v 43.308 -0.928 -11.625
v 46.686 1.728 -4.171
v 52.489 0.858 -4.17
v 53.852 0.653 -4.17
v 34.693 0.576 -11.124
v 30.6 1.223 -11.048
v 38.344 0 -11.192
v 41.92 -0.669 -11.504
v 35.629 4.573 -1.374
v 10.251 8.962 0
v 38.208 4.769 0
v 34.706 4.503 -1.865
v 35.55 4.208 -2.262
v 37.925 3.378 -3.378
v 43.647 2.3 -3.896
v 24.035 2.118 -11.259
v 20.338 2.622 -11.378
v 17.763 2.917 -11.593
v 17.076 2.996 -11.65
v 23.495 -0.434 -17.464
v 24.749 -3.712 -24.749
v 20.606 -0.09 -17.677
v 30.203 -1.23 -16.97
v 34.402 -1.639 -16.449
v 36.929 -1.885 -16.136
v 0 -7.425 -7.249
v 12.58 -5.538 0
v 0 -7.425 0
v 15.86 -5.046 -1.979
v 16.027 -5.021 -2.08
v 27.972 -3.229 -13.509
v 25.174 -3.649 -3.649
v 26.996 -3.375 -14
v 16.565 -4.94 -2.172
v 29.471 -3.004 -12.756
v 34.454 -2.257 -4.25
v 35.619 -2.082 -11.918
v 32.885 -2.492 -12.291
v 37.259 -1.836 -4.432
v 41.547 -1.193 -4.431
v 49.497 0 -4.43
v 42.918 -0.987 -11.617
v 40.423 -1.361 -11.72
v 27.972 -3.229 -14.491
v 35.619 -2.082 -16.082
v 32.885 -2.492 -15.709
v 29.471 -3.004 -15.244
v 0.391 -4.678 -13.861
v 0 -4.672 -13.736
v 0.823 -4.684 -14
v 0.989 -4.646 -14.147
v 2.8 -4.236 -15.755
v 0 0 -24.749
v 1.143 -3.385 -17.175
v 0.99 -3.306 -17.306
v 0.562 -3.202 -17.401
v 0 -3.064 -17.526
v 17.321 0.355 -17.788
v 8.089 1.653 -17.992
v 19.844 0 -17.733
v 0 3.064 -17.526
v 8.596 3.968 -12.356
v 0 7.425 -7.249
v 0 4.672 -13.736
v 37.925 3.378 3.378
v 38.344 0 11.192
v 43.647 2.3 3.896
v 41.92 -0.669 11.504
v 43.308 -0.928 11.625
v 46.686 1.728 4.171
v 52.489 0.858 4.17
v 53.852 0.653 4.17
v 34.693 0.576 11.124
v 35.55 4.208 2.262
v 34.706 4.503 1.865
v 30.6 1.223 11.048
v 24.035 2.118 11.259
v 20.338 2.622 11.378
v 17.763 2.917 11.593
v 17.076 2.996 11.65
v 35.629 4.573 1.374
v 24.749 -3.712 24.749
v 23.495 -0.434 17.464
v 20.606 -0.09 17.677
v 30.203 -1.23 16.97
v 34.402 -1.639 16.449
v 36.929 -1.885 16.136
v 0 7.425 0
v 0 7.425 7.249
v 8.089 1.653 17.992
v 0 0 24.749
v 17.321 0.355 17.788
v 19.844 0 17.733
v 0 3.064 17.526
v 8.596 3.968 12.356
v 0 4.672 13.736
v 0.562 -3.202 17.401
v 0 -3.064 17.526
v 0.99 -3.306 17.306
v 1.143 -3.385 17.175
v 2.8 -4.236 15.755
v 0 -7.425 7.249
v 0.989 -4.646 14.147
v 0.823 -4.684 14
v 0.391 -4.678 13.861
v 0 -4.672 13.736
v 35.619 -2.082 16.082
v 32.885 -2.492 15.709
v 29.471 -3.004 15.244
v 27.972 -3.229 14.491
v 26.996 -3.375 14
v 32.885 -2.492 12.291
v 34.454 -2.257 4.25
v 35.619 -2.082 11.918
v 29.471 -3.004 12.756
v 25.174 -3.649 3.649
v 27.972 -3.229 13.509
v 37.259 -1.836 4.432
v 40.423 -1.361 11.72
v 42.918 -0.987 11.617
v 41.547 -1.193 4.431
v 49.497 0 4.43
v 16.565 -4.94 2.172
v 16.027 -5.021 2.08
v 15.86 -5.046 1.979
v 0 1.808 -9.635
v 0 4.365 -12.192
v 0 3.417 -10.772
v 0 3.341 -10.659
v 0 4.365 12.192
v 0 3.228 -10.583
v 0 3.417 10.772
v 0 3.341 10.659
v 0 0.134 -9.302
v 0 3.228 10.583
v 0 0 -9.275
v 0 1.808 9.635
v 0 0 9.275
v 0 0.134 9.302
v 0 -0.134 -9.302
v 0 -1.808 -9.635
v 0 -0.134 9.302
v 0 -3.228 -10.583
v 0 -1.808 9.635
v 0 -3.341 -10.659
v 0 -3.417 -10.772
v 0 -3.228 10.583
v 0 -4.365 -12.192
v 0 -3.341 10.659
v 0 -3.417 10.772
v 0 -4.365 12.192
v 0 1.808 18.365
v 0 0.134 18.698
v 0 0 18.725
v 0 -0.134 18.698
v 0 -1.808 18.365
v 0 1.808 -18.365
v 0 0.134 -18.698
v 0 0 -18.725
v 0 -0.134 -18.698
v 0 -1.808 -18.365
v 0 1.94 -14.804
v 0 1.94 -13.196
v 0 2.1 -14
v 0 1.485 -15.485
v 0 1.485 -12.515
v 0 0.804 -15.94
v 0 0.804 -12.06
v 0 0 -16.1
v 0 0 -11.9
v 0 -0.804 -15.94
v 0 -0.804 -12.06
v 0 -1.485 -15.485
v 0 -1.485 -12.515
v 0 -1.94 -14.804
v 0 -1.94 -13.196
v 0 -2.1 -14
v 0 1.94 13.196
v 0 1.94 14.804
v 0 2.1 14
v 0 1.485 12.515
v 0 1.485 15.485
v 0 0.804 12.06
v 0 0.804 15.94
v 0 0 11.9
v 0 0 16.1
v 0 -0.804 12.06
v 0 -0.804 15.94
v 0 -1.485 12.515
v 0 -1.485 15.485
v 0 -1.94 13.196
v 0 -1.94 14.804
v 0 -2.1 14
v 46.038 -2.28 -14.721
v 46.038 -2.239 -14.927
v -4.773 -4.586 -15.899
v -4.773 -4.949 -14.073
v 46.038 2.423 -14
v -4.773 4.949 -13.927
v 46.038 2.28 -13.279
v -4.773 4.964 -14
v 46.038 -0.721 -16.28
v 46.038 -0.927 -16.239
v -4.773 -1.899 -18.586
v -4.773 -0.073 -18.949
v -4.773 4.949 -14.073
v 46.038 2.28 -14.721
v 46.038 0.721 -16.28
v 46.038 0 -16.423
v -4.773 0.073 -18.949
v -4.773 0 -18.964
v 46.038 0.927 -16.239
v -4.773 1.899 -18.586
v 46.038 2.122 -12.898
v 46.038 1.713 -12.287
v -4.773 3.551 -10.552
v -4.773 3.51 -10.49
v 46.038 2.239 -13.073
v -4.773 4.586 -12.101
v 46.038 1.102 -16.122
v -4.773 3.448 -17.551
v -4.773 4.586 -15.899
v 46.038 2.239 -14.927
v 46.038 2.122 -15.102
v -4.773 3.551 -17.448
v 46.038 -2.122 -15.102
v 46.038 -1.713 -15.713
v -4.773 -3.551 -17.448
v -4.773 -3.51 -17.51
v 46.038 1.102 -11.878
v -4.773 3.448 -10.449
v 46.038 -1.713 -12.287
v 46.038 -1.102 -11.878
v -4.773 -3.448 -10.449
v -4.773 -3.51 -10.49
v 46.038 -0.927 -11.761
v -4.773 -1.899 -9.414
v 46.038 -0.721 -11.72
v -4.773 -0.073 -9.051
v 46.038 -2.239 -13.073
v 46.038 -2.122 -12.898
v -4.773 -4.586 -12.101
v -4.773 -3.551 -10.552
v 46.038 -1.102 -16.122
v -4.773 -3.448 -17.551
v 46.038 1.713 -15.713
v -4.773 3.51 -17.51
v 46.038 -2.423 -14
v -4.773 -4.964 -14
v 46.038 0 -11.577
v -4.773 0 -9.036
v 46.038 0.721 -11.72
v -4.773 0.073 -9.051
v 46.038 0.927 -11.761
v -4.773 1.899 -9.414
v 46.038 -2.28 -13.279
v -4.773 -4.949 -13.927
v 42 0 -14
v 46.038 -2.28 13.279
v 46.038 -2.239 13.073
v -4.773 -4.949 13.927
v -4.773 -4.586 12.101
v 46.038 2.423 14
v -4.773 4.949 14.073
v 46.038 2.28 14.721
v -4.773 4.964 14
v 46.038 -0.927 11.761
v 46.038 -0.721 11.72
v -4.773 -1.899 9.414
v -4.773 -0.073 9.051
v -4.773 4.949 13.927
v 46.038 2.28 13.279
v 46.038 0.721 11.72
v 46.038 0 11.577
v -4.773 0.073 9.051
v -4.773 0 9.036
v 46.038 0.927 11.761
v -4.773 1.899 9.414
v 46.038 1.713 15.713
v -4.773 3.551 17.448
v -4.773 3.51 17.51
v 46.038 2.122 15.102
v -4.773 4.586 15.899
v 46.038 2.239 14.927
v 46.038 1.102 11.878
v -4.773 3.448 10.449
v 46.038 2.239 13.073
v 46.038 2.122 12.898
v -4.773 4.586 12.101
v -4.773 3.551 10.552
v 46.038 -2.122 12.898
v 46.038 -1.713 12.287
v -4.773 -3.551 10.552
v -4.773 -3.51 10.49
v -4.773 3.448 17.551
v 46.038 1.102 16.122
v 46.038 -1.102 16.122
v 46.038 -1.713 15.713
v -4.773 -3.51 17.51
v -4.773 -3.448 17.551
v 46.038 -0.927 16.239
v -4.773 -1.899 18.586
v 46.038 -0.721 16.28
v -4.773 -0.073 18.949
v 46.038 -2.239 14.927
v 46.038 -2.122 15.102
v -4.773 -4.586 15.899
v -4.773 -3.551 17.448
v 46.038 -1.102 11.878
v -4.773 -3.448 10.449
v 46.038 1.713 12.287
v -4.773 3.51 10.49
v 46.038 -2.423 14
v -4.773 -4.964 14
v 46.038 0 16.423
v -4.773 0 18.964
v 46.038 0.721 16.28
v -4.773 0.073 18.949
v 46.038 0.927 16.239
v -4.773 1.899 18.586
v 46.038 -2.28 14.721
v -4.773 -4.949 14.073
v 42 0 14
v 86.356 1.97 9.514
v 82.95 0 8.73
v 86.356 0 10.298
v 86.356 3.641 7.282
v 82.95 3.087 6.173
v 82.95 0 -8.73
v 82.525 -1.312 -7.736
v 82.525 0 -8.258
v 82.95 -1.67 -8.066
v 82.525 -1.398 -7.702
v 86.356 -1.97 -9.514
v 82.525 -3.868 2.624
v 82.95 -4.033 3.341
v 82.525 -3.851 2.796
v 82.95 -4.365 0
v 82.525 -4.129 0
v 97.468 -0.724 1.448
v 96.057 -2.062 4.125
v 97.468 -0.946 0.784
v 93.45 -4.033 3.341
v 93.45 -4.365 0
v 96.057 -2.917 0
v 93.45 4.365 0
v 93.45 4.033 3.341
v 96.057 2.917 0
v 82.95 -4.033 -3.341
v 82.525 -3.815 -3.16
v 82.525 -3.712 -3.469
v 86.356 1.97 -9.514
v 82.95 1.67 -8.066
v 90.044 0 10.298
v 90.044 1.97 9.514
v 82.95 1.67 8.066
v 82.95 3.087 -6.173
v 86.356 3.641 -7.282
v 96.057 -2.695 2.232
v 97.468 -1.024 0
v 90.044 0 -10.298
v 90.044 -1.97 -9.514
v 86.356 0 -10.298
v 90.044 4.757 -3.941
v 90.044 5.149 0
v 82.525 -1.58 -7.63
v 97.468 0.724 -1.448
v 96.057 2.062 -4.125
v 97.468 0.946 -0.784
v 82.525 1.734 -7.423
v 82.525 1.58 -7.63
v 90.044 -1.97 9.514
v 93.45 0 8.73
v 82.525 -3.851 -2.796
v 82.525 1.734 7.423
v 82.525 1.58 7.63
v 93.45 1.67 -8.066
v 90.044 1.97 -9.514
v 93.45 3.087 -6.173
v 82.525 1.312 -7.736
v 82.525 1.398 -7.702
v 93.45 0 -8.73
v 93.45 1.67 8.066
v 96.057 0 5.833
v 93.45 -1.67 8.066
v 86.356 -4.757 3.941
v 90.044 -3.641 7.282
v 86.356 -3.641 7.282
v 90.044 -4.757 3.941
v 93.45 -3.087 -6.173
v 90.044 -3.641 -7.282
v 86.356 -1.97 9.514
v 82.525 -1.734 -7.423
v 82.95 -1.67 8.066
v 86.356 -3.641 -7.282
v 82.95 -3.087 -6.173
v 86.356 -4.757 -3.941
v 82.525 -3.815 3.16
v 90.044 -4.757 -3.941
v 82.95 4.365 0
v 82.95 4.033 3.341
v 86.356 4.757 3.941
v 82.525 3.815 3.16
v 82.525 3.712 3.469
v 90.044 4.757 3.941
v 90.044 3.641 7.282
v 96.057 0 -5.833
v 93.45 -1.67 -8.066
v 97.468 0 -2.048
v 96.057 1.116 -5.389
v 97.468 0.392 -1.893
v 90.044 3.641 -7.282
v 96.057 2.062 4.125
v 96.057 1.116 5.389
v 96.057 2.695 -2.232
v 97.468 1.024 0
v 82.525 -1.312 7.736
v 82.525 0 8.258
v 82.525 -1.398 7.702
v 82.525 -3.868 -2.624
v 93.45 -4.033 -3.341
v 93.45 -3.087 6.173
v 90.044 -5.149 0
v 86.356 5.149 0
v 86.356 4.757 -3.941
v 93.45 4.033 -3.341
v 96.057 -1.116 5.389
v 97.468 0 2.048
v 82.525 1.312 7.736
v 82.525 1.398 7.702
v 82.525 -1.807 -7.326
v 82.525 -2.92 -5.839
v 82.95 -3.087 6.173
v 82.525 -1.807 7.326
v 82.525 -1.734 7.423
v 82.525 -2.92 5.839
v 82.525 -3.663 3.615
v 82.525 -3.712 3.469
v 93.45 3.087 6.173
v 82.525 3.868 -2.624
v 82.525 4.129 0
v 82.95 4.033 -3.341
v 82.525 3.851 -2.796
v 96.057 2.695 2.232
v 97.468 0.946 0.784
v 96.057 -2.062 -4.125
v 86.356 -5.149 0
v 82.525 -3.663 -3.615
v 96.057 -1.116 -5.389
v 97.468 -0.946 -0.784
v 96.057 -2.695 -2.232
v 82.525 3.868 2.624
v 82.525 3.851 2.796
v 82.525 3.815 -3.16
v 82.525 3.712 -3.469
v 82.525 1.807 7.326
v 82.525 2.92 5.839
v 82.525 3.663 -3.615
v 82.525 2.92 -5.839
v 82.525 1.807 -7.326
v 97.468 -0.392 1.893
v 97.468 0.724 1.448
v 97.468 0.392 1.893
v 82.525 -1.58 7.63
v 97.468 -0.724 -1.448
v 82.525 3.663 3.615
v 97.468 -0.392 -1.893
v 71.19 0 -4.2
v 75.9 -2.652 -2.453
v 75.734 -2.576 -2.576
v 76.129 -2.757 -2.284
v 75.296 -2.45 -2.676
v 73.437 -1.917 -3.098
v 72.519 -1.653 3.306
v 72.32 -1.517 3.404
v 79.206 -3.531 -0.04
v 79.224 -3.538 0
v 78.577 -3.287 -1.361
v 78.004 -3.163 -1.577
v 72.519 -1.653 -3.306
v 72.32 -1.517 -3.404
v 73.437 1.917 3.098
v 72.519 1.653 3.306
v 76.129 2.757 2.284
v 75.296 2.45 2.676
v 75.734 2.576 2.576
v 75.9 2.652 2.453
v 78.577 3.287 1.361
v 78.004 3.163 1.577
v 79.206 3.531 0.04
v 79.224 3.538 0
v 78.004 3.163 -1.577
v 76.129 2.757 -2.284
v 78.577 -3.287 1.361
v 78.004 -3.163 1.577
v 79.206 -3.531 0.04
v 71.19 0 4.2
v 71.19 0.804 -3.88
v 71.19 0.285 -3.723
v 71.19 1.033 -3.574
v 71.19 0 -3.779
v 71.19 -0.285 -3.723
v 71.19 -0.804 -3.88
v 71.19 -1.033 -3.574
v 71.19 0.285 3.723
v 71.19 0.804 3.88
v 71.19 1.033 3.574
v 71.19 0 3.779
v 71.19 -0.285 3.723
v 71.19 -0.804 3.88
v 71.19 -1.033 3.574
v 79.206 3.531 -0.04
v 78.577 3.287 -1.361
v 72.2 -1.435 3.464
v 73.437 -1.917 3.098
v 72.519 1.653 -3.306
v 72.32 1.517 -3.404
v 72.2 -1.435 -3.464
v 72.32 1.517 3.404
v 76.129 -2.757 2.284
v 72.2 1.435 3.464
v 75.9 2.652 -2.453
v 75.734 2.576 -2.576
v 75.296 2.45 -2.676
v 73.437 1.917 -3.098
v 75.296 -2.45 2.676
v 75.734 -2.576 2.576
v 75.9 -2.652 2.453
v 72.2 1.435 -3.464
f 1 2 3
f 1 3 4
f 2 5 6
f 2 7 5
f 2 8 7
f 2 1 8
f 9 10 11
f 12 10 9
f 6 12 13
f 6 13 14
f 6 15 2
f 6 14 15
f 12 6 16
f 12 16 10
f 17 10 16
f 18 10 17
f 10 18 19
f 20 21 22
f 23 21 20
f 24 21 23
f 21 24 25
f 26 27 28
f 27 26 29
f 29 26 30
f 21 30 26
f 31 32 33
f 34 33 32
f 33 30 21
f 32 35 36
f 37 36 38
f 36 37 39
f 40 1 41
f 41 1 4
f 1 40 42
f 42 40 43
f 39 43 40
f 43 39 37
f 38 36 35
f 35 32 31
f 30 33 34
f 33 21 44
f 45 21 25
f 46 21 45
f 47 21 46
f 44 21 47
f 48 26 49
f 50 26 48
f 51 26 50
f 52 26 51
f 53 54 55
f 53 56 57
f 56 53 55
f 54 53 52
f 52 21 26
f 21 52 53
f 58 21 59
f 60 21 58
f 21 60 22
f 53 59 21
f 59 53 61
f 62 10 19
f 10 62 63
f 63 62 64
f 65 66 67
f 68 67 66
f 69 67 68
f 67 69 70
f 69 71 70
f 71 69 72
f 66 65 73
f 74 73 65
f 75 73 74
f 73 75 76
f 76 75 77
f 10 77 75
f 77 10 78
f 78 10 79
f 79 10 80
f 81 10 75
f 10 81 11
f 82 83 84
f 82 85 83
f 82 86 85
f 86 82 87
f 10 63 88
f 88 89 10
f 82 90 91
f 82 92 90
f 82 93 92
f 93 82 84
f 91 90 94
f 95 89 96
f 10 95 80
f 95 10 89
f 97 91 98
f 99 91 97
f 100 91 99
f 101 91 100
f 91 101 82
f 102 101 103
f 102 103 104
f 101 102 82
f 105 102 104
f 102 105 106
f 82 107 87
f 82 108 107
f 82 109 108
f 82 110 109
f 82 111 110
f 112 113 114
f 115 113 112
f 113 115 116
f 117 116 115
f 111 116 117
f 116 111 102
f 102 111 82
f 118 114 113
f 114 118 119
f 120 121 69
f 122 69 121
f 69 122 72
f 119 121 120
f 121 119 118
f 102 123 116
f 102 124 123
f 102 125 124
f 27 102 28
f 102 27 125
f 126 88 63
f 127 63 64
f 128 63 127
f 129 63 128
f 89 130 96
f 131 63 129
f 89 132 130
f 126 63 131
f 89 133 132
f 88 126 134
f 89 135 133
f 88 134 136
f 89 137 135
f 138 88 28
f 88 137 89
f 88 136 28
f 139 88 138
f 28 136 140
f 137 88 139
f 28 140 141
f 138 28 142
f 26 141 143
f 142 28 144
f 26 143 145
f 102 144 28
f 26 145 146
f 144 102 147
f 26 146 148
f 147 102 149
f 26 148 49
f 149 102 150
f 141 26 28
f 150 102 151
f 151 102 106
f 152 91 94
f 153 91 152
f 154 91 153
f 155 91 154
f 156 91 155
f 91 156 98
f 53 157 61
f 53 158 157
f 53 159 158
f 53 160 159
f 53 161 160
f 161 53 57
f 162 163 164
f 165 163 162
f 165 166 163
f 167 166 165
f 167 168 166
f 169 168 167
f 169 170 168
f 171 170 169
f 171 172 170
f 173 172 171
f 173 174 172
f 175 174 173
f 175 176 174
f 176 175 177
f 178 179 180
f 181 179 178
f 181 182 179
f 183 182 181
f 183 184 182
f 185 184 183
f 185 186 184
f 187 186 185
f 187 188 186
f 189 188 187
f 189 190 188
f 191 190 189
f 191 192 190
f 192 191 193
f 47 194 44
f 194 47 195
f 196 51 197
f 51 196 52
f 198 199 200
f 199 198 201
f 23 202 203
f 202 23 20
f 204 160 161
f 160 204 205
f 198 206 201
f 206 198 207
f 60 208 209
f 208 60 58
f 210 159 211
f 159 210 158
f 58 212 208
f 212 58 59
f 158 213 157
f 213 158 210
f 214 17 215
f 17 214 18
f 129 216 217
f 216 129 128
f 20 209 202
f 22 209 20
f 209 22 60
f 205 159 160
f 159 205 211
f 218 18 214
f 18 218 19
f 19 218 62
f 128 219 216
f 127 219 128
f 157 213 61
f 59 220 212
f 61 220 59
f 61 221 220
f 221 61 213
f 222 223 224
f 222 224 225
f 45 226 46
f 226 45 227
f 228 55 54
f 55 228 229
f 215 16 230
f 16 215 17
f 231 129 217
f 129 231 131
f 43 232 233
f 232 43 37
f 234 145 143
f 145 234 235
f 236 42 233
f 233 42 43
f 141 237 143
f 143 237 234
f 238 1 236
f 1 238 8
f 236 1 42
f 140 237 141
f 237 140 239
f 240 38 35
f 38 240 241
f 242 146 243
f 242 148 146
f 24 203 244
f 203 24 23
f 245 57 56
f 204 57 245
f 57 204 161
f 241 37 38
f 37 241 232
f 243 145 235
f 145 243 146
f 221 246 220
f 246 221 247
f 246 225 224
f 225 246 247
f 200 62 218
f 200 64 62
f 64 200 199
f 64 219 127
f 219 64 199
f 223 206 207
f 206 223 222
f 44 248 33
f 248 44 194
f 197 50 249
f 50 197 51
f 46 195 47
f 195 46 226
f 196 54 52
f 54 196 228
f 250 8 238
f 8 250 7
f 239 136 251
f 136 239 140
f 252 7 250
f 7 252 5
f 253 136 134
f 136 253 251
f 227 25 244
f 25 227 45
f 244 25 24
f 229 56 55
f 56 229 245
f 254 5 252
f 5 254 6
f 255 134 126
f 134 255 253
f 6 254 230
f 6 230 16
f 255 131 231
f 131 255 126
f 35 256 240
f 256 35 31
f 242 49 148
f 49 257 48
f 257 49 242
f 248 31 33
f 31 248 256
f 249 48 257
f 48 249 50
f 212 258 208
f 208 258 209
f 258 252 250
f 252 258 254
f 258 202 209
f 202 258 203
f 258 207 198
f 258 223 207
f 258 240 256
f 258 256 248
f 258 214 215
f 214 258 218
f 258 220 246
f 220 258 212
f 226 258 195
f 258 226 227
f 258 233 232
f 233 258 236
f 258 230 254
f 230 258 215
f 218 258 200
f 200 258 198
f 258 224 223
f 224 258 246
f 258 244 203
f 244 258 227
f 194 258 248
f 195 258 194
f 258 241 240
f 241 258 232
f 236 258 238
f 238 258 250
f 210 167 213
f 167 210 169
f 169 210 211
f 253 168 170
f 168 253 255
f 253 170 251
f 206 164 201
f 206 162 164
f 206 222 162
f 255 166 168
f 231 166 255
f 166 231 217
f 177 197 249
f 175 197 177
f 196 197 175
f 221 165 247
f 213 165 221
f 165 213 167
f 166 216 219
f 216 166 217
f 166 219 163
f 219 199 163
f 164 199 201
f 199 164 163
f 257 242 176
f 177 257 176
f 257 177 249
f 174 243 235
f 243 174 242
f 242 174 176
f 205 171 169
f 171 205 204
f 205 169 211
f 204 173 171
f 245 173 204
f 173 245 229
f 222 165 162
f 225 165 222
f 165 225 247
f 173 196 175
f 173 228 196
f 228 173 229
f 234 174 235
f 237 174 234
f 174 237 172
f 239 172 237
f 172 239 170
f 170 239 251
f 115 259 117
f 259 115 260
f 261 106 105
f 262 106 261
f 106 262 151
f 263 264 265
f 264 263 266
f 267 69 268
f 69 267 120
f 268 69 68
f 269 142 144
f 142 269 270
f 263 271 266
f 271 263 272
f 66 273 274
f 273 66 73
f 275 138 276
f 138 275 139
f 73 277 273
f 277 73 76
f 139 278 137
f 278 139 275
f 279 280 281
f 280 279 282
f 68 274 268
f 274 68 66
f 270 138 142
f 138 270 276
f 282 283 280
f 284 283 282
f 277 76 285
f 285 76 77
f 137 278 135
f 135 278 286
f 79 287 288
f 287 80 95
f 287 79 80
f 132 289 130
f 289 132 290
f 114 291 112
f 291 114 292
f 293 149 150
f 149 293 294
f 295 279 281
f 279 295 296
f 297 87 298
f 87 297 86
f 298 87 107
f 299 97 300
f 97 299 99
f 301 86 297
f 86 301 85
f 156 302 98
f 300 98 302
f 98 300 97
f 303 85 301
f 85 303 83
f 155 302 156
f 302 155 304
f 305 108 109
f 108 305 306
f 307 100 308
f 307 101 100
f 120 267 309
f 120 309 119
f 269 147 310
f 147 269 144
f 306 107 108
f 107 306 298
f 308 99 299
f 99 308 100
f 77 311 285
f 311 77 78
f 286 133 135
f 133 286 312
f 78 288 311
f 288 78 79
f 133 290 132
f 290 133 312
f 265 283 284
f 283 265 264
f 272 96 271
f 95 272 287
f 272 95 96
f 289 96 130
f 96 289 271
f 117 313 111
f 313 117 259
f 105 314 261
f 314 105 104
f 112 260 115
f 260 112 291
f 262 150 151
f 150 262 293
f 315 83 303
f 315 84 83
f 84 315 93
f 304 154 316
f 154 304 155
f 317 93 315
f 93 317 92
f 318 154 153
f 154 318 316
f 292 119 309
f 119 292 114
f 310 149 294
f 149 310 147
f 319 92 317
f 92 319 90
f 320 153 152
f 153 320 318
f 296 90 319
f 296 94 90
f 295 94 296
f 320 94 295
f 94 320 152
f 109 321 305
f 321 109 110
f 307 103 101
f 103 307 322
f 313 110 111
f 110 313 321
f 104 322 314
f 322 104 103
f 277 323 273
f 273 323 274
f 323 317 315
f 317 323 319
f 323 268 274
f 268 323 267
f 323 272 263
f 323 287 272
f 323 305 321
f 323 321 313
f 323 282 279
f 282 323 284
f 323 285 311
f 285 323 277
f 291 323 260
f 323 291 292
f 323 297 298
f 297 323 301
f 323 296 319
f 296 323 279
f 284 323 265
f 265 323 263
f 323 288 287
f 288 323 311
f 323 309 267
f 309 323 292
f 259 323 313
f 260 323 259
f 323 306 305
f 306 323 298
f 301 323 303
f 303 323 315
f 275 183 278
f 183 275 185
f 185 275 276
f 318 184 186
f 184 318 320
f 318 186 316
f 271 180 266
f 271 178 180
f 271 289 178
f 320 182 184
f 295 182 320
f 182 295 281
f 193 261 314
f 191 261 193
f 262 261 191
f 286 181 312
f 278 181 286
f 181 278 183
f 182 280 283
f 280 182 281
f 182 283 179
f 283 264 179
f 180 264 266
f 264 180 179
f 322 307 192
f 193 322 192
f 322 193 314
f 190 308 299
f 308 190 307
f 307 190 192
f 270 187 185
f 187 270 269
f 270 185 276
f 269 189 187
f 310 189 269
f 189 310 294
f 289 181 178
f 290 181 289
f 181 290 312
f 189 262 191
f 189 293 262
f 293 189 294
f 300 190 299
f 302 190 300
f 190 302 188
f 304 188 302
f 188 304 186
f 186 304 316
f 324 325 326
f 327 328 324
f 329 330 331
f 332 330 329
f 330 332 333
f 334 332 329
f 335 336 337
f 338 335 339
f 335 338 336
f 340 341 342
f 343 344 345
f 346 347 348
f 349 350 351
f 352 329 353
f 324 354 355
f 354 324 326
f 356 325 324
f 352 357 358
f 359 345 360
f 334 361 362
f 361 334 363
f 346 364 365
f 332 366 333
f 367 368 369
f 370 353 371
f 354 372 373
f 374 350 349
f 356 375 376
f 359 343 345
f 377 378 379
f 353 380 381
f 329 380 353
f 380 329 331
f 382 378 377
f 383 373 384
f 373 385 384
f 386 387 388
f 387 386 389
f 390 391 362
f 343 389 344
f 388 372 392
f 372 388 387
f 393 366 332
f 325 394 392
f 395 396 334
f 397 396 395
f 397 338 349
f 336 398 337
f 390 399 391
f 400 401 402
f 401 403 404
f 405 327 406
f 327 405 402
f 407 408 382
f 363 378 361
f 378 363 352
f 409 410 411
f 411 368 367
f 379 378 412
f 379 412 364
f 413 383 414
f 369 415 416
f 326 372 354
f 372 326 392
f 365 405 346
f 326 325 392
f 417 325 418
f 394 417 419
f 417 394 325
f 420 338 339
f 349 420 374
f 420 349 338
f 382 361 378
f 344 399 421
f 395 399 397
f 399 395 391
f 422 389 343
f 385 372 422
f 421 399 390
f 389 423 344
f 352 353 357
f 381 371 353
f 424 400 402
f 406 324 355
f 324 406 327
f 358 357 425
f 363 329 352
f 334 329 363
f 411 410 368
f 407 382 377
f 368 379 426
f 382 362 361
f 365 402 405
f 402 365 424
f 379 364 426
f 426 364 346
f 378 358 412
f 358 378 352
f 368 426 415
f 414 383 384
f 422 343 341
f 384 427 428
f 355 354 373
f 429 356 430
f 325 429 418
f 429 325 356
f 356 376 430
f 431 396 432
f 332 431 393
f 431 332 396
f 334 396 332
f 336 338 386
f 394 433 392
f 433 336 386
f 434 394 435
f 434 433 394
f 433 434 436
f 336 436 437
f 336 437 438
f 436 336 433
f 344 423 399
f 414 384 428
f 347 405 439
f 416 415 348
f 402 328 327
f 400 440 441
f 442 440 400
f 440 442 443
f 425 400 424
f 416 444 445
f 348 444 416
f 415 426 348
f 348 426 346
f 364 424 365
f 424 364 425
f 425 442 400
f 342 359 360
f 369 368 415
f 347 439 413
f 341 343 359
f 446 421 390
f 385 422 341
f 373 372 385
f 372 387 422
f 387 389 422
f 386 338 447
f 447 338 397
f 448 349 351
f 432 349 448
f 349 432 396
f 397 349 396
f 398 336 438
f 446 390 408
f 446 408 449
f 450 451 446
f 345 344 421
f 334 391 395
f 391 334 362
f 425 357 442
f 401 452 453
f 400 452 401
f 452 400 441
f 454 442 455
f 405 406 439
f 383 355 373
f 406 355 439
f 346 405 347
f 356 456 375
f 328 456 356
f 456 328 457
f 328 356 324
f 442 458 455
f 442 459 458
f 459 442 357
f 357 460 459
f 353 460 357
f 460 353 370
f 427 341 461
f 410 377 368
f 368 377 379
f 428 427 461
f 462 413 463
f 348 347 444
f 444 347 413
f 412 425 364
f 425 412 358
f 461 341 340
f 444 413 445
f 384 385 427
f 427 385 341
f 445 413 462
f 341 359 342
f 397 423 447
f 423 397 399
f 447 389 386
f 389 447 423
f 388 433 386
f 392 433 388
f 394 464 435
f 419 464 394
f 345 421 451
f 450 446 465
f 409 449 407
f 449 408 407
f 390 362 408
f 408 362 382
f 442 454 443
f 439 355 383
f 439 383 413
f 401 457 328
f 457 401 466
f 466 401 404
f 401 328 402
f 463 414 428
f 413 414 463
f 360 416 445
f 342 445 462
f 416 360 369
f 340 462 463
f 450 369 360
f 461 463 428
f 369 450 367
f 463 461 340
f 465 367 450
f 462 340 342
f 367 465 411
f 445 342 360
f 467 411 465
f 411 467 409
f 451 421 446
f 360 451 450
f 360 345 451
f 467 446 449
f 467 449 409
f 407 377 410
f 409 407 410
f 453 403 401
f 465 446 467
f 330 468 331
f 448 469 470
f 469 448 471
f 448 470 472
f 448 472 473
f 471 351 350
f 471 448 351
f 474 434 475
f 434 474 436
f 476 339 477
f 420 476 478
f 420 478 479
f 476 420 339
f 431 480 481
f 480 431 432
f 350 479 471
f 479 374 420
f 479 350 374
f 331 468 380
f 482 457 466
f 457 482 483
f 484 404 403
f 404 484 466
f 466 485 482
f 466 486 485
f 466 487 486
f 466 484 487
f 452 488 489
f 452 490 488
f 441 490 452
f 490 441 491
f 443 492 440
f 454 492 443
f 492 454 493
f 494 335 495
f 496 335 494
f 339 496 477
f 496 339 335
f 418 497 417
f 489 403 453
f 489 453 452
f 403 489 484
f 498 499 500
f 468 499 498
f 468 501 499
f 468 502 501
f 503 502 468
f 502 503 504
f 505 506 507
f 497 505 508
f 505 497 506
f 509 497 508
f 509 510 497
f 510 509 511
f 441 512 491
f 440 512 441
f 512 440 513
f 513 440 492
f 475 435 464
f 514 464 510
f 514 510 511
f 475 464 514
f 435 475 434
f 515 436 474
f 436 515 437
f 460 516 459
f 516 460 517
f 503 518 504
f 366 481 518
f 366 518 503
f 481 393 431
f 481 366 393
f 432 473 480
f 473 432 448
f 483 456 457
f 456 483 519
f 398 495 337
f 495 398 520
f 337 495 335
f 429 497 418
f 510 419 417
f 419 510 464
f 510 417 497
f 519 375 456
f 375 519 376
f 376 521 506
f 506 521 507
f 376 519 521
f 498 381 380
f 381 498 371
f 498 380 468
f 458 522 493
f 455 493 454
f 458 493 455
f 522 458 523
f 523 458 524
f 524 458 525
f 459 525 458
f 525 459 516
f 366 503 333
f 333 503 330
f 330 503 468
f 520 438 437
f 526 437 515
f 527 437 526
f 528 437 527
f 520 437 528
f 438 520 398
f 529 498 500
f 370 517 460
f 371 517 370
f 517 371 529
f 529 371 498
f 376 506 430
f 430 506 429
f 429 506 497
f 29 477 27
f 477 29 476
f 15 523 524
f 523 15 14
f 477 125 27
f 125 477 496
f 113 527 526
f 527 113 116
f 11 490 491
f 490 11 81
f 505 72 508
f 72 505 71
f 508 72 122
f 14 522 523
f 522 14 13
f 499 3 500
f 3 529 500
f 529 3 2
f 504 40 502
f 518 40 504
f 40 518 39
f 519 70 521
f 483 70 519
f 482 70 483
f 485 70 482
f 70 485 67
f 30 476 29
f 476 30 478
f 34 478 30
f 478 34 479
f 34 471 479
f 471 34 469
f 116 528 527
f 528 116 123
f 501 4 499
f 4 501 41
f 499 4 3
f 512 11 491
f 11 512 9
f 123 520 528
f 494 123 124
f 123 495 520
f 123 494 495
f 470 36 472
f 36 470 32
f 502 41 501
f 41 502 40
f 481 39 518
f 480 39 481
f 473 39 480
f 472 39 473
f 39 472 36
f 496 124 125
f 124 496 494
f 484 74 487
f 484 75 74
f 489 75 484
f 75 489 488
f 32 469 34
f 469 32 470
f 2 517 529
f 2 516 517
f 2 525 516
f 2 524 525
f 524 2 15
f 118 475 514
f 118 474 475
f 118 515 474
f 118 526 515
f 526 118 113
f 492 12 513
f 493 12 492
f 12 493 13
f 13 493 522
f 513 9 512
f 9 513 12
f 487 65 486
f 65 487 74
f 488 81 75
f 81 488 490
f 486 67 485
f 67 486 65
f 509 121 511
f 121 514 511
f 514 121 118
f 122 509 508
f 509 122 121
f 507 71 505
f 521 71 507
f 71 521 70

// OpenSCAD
$fn=16;

module engine()
{
	rotate(a = 90, v = [1, 0, 0]) {
		difference() {
			cylinder(h = 9, r1 = 0.75, r2 = 0.3, center = true);
			translate(v = [0, 0, 5.5])
				cylinder(h = 5, r1 = 0, r2 = 3,  center = true);
			translate(v = [0, 0, -5])
				cylinder(h = 5, r1 = 3, r2 = 0,  center = true);
		}
	}
}

module wedge()
{

	difference() {
		scale(v = [5, 10, 1.5]) {
			rotate(a = 45, v = [1, 0, 0])
				rotate(a = 45, v = [0, 1, 0])
					cube(size = 1, center = true);
		}
		translate(v = [0, 5, 0])
			cube(size = 10, center = true);
	}
}

module main_body()
{
	rotate(a = -90, v = [1, 0, 0])
	rotate(a = 90, v = [0, 0, 1])
	union() {
		wedge();
		translate(v = [2, -3, 0])
			engine();
		translate(v = [-2, -3, 0])
			engine();
	}
}

module neck()
{
	translate(v = [6.5, 0, 0])
	rotate(a = -90, v = [1, 0, 0])
		rotate(a = 90, v = [0, 1, 0])
			cylinder(h = 10, r1 = 0.8, r2 = 0.5, center = true);
}

module cockpit()
{
	scale(v = [0.9, 0.5, 1.0])
	translate(v = [14, 0, 0])
	rotate(v = [0, 0, 1], a = 180)
	rotate(v = [0, 1, 0], a = 90)
	scale(v = [0.3, 0.3, 0.3])
	union() {
		sphere(r = 5, center = true);
		translate(v = [0, 0, 4.5])
			cylinder(h = 9, r1 = 4.9, r2 = 2, center = true);
	}
}

module conquerer()
{
	scale(v = [7, 7, 7]) {
		main_body();
		neck();
		cockpit();
	}
}

conquerer();
